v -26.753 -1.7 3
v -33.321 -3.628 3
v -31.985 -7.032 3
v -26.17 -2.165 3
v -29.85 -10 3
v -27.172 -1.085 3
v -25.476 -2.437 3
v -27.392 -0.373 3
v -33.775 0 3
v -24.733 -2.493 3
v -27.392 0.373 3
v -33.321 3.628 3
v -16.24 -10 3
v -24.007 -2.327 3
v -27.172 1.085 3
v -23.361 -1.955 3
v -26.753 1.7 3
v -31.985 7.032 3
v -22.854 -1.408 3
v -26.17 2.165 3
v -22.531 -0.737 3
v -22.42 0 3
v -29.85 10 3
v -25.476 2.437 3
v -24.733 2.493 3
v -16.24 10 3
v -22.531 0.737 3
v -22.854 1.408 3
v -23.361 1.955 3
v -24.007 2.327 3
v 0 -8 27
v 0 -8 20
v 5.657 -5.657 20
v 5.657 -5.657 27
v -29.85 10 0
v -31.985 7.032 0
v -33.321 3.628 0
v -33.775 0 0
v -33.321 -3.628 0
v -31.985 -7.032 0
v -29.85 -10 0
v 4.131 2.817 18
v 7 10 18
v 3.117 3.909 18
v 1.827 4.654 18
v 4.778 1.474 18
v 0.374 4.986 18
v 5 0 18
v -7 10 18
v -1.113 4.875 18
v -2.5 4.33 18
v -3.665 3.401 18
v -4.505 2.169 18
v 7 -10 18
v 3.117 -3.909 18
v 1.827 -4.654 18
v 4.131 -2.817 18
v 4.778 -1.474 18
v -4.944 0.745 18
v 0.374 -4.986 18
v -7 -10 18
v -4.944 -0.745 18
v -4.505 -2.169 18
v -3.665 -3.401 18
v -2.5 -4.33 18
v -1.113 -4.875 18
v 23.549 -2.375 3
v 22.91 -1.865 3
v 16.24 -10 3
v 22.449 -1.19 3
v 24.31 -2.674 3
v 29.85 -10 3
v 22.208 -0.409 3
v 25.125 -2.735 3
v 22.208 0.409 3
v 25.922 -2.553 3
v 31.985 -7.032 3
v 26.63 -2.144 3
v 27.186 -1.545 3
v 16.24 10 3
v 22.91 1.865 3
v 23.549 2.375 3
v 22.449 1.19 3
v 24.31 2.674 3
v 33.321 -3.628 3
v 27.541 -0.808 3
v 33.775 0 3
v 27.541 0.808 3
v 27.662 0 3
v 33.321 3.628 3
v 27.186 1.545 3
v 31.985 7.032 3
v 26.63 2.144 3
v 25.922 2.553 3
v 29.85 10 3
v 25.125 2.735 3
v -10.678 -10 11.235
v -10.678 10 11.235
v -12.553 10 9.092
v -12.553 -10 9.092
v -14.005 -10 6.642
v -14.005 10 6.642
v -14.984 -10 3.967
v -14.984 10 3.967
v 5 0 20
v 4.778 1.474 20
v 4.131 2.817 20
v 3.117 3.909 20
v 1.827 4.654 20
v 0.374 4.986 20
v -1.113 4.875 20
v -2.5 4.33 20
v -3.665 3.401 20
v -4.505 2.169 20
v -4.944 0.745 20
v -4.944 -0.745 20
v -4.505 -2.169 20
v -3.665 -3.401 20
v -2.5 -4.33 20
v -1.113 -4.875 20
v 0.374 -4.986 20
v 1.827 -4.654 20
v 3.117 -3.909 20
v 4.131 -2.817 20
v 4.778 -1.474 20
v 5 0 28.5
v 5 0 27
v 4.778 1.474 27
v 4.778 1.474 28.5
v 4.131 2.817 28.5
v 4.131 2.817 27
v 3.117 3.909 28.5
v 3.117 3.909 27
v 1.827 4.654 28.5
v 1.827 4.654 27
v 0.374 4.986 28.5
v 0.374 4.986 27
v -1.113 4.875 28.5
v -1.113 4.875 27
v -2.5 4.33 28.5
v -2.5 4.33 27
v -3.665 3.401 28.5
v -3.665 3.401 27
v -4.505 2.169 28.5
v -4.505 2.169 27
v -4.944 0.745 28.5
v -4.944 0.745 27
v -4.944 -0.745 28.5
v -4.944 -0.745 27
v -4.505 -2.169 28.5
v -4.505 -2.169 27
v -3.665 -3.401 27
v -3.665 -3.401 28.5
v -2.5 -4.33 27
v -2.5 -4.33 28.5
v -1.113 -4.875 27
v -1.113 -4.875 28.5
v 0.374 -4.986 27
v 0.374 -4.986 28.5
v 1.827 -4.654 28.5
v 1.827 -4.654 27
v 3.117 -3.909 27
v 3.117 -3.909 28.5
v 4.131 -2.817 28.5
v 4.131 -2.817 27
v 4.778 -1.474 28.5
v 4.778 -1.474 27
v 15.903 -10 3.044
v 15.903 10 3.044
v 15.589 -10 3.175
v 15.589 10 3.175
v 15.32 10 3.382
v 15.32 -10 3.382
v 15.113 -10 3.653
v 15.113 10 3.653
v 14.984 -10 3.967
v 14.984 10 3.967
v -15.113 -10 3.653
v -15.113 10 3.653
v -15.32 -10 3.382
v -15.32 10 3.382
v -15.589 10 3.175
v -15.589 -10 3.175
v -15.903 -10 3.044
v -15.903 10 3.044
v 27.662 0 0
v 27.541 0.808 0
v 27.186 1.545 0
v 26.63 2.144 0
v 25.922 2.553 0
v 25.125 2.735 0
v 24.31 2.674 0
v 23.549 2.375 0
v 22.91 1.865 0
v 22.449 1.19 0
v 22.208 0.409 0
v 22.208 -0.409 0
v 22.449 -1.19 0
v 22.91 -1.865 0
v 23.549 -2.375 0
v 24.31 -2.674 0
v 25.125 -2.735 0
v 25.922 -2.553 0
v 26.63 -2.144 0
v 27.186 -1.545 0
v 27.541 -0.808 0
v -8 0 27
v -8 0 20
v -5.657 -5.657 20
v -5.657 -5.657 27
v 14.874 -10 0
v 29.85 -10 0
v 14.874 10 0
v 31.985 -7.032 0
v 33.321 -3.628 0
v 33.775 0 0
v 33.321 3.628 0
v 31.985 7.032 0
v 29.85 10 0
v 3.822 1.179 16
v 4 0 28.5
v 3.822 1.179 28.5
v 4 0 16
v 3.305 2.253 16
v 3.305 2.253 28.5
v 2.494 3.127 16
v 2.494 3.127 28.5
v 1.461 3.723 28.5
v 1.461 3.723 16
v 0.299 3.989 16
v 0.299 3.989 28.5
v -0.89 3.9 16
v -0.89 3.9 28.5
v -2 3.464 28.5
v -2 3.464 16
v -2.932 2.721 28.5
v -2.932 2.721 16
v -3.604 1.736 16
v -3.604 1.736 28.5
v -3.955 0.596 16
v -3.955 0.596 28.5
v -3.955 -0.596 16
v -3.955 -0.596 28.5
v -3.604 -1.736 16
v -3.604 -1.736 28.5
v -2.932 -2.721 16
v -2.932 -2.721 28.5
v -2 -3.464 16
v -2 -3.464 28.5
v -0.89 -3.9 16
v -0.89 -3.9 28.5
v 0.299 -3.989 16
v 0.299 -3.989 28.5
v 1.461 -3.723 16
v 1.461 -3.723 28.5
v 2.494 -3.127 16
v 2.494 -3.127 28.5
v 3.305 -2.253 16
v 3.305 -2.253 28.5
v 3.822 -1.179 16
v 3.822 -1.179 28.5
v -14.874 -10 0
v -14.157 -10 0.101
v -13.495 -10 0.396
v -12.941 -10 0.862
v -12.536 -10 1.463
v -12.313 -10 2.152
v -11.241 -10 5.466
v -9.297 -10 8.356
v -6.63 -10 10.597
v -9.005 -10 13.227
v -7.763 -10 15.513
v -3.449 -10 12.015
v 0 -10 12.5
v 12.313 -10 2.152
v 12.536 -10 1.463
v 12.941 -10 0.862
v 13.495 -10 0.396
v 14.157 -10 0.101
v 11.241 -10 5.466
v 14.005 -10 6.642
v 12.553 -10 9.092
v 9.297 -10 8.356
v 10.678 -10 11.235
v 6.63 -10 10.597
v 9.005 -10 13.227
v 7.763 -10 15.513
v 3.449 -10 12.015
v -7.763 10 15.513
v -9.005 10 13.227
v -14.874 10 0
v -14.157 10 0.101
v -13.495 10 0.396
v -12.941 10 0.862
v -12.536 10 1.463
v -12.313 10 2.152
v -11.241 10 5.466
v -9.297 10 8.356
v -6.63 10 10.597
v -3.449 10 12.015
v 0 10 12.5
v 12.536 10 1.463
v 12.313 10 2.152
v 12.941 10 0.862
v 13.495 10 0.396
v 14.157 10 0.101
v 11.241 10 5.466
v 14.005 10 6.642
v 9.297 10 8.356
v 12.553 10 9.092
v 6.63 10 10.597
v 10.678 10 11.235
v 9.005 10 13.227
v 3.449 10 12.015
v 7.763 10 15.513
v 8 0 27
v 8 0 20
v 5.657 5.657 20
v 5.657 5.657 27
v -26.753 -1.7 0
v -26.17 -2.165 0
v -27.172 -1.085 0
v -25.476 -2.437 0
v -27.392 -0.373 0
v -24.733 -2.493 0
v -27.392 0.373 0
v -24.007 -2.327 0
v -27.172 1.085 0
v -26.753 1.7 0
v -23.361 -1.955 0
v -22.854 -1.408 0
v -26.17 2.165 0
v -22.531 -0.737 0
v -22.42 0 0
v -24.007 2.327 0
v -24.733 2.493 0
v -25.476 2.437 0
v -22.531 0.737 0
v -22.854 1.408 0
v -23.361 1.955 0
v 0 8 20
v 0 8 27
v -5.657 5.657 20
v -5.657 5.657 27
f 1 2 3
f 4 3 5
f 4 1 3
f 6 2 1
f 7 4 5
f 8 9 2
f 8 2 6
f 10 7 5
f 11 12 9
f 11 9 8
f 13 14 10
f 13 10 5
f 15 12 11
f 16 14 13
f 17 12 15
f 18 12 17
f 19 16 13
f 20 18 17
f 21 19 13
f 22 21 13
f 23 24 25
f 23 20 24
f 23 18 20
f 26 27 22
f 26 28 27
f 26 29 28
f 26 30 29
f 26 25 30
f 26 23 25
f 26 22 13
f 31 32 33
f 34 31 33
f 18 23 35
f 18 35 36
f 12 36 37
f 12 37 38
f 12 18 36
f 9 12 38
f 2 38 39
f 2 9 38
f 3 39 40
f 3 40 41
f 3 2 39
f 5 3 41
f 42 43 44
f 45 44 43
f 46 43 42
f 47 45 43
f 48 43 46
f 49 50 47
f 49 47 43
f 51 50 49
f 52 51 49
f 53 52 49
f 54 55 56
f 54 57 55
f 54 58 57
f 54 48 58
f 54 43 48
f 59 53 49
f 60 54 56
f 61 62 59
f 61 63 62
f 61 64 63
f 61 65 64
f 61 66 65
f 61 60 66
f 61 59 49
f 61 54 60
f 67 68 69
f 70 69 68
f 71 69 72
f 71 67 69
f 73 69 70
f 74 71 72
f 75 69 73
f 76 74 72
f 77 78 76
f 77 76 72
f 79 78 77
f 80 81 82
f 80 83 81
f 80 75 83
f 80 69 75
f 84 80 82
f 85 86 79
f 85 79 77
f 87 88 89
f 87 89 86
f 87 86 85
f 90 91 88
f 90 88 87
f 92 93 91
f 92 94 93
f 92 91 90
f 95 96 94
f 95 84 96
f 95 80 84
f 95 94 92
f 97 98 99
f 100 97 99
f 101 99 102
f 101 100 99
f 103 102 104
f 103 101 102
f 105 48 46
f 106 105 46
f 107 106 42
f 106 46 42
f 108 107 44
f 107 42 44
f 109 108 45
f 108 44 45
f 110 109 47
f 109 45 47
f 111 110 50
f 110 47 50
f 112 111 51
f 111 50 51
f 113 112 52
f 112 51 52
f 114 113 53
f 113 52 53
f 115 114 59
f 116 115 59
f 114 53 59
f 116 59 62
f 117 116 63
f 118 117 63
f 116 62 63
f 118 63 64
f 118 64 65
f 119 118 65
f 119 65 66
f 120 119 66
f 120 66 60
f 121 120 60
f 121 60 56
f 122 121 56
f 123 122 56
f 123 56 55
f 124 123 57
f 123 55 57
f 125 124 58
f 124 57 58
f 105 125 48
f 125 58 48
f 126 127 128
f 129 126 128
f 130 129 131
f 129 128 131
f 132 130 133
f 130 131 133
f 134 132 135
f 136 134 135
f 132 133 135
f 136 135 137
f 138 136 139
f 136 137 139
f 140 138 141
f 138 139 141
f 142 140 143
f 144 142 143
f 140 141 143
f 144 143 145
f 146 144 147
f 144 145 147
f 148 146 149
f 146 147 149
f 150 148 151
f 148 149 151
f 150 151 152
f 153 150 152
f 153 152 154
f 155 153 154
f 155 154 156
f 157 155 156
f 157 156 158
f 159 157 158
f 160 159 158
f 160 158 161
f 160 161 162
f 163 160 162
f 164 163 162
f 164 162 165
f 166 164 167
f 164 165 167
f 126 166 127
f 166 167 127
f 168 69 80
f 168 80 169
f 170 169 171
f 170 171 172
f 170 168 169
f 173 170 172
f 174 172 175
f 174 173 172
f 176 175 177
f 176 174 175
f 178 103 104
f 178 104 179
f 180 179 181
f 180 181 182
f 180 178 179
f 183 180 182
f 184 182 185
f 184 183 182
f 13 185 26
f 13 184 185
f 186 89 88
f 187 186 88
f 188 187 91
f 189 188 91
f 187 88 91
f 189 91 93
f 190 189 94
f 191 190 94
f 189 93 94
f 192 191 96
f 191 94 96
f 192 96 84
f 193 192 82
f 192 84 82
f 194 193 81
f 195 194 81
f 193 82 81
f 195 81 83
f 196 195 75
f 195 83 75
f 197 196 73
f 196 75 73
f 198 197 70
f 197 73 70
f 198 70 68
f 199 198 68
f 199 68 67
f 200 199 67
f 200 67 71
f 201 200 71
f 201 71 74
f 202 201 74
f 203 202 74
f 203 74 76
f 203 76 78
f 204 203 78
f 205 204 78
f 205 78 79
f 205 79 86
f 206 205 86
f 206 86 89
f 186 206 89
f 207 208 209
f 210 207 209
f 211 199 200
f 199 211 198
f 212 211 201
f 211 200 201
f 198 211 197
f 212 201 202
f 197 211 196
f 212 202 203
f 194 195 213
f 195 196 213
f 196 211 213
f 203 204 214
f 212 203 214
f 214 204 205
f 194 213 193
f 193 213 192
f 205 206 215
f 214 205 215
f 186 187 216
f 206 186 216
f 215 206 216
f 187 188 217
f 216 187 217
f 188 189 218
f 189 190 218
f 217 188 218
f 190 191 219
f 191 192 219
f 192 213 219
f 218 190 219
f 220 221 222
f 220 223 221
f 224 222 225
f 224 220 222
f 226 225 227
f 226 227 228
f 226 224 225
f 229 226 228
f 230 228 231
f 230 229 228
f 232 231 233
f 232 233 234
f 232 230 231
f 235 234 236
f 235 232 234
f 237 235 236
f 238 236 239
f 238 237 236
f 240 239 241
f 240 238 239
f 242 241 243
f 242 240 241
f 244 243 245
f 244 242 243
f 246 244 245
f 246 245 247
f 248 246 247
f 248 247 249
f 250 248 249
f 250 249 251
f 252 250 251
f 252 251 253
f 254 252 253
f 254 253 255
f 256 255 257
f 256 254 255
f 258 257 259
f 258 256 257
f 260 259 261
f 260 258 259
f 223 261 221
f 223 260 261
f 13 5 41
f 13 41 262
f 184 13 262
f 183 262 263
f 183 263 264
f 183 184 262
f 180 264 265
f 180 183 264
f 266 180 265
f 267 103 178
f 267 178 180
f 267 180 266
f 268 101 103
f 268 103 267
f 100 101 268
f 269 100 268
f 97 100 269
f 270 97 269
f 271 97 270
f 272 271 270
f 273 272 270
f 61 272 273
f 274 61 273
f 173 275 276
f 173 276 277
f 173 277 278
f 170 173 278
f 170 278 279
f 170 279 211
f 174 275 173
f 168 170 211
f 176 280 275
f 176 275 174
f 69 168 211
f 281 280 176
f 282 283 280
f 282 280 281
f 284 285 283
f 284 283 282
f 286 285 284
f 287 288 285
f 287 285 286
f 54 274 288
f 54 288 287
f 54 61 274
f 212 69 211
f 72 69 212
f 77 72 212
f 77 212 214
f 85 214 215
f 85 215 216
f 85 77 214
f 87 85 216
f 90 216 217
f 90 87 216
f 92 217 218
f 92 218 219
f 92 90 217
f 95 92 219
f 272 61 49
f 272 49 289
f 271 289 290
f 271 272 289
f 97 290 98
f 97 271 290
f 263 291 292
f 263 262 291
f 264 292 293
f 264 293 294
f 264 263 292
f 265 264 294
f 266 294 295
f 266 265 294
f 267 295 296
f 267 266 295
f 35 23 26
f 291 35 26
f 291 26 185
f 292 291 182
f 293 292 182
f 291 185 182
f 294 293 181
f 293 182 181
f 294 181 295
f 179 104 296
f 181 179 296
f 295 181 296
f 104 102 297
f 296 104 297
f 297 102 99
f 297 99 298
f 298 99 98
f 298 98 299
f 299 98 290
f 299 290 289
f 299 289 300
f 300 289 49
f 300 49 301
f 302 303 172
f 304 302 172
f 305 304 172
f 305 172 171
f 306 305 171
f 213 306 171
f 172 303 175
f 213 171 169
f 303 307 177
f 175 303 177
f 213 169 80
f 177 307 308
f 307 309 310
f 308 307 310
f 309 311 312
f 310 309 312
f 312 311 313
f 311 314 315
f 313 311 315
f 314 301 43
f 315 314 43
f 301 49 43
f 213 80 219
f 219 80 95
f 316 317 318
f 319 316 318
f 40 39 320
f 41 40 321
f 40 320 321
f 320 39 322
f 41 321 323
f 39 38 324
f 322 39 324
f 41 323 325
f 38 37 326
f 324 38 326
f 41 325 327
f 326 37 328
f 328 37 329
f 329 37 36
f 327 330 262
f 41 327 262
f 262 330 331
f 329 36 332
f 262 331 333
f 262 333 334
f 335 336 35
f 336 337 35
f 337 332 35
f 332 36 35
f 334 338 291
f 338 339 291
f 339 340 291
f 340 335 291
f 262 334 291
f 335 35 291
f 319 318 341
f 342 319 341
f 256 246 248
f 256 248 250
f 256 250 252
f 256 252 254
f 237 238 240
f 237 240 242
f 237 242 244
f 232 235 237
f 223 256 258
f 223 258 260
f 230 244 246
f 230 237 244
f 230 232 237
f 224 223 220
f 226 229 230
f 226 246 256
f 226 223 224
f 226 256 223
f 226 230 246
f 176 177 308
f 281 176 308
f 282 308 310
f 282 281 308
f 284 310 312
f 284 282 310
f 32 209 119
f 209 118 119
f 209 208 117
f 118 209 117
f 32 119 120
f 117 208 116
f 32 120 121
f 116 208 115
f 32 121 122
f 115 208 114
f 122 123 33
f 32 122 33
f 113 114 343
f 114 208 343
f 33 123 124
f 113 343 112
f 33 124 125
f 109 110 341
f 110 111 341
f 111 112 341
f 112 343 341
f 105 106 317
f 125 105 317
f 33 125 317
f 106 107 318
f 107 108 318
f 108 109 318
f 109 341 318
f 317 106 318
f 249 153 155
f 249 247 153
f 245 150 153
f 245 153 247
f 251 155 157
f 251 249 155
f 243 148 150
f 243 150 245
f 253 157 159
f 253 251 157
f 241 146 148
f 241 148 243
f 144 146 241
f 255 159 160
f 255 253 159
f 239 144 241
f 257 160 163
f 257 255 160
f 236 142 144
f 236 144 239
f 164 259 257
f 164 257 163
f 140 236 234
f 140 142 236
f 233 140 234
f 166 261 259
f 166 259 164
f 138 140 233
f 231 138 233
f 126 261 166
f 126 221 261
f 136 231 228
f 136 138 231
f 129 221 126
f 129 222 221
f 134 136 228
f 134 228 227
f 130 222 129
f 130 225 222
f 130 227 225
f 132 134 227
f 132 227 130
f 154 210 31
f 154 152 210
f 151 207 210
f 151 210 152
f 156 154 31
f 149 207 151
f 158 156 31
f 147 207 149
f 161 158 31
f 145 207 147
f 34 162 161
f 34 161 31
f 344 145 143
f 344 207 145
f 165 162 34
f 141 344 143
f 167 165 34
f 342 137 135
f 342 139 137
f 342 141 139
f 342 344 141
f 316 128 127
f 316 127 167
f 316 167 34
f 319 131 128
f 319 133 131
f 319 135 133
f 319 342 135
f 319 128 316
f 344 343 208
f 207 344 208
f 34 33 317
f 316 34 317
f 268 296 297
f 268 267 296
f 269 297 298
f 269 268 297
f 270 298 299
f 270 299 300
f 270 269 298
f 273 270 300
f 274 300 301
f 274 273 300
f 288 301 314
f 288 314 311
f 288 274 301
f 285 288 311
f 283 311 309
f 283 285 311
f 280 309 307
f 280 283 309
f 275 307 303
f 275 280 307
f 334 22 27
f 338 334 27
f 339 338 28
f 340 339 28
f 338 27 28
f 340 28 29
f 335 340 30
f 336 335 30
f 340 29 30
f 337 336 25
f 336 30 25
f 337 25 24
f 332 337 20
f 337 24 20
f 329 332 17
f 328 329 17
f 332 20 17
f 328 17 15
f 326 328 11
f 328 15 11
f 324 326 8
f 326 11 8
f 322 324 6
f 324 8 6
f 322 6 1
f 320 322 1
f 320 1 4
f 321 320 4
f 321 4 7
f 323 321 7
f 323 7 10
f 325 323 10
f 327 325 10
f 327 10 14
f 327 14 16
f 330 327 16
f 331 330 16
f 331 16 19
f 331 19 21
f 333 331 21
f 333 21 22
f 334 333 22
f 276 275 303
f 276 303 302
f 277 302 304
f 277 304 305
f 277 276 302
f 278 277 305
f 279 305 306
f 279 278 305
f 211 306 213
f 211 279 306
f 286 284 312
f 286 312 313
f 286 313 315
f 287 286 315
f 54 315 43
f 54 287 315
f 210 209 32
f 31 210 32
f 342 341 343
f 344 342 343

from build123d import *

# Parameters (mm, degrees)
F1_DEPTH  = 10
F2_R      = 2.5
F2_R_2    = 2.7424095939
F3_DEPTH  = 25
F5_DEPTH  = 3
F7_DEPTH  = 3
F8_R      = 5
F9_DEPTH  = 2
F11_DEPTH = 7
F12_R     = 5
F12_R_2   = 4
F13_DEPTH = 1.5
F14_DEPTH = 11


with BuildPart() as f1:
    # F0 (on Front) → F1 (new body, symmetric)
    with BuildSketch(Plane.XZ):
        with BuildLine():
            ThreePointArc((-12.3133069376, 2.1523178808), (0, 12.5), (12.3133069376, 2.1523178808))
            ThreePointArc((12.3133069376, 2.1523178808), (13.2017484895, 0.6095259974), (14.8744747806, 0))
            Line((14.8744747806, 0), (29.85, 0))
            Line((29.85, 0), (29.85, 3))
            Line((29.85, 3), (16.2403817689, 3))
            ThreePointArc((16.2403817689, 3), (15.4474629596, 3.2698156661), (14.9836855606, 3.9672619048))
            ThreePointArc((14.9836855606, 3.9672619048), (13.3355324821, 7.9002261625), (10.6780077367, 11.2352192135))
            ThreePointArc((10.6780077367, 11.2352192135), (8.326658054, 14.3390474584), (7, 18))
            Line((7, 18), (-7, 18))
            ThreePointArc((-7, 18), (-8.326658054, 14.3390474584), (-10.6780077367, 11.2352192135))
            ThreePointArc((-10.6780077367, 11.2352192135), (-13.3355324821, 7.9002261625), (-14.9836855606, 3.9672619048))
            ThreePointArc((-14.9836855606, 3.9672619048), (-15.4474629596, 3.2698156661), (-16.2403817689, 3))
            Line((-16.2403817689, 3), (-29.85, 3))
            Line((-29.85, 3), (-29.85, 0))
            Line((-29.85, 0), (-14.8744747806, 0))
            ThreePointArc((-14.8744747806, 0), (-13.2017484895, 0.6095259974), (-12.3133069376, 2.1523178808))
        make_face()
    extrude(amount=F1_DEPTH, both=True)

    # F2 (on face) → F3 (cut)
    with BuildSketch(Plane.XY.offset(3)):
        with Locations((-24.92, 0)):
            Circle(F2_R)
        with Locations((24.92, 0)):
            Circle(F2_R_2)
    extrude(amount=-F3_DEPTH, mode=Mode.SUBTRACT)

    # F4 (on face) → F5 (join)
    with BuildSketch(Plane.XY.offset(3)):
        with BuildLine():
            Line((-29.85, -10), (-29.85, 10))
            ThreePointArc((-29.85, 10), (-33.7754930507, 0), (-29.85, -10))
        make_face()
    extrude(amount=-F5_DEPTH)

    # F6 (on face) → F7 (join)
    with BuildSketch(Plane.XY.offset(3)):
        with BuildLine():
            Line((29.85, 10), (29.85, -10))
            ThreePointArc((29.85, -10), (33.7754930507, 0), (29.85, 10))
        make_face()
    extrude(amount=-F7_DEPTH)

    # F8 (on face) → F9 (join)
    with BuildSketch(Plane.XY.offset(18)):
        Circle(F8_R)
    extrude(amount=F9_DEPTH)

    # F10 (on face) → F11 (join)
    with BuildSketch(Plane.XY.offset(20)):
        Polygon((5.6568542495, 5.6568542495), (0, 8), (-5.6568542495, 5.6568542495), (-8, 0), (-5.6568542495, -5.6568542495), (0, -8), (5.6568542495, -5.6568542495), (8, 0), align=None)
    extrude(amount=F11_DEPTH)

    # F12 (on face) → F13 (join)
    with BuildSketch(Plane.XY.offset(27)):
        Circle(F12_R)
        Circle(F12_R_2, mode=Mode.SUBTRACT)
    extrude(amount=F13_DEPTH)

    # F14 (cut): a face of the model
    f14_faces = [f1.faces().sort_by_distance(p)[0] for p in [
        (0, 0, 27),
    ]]
    extrude(f14_faces, amount=-F14_DEPTH, mode=Mode.SUBTRACT)


solid = f1.part
